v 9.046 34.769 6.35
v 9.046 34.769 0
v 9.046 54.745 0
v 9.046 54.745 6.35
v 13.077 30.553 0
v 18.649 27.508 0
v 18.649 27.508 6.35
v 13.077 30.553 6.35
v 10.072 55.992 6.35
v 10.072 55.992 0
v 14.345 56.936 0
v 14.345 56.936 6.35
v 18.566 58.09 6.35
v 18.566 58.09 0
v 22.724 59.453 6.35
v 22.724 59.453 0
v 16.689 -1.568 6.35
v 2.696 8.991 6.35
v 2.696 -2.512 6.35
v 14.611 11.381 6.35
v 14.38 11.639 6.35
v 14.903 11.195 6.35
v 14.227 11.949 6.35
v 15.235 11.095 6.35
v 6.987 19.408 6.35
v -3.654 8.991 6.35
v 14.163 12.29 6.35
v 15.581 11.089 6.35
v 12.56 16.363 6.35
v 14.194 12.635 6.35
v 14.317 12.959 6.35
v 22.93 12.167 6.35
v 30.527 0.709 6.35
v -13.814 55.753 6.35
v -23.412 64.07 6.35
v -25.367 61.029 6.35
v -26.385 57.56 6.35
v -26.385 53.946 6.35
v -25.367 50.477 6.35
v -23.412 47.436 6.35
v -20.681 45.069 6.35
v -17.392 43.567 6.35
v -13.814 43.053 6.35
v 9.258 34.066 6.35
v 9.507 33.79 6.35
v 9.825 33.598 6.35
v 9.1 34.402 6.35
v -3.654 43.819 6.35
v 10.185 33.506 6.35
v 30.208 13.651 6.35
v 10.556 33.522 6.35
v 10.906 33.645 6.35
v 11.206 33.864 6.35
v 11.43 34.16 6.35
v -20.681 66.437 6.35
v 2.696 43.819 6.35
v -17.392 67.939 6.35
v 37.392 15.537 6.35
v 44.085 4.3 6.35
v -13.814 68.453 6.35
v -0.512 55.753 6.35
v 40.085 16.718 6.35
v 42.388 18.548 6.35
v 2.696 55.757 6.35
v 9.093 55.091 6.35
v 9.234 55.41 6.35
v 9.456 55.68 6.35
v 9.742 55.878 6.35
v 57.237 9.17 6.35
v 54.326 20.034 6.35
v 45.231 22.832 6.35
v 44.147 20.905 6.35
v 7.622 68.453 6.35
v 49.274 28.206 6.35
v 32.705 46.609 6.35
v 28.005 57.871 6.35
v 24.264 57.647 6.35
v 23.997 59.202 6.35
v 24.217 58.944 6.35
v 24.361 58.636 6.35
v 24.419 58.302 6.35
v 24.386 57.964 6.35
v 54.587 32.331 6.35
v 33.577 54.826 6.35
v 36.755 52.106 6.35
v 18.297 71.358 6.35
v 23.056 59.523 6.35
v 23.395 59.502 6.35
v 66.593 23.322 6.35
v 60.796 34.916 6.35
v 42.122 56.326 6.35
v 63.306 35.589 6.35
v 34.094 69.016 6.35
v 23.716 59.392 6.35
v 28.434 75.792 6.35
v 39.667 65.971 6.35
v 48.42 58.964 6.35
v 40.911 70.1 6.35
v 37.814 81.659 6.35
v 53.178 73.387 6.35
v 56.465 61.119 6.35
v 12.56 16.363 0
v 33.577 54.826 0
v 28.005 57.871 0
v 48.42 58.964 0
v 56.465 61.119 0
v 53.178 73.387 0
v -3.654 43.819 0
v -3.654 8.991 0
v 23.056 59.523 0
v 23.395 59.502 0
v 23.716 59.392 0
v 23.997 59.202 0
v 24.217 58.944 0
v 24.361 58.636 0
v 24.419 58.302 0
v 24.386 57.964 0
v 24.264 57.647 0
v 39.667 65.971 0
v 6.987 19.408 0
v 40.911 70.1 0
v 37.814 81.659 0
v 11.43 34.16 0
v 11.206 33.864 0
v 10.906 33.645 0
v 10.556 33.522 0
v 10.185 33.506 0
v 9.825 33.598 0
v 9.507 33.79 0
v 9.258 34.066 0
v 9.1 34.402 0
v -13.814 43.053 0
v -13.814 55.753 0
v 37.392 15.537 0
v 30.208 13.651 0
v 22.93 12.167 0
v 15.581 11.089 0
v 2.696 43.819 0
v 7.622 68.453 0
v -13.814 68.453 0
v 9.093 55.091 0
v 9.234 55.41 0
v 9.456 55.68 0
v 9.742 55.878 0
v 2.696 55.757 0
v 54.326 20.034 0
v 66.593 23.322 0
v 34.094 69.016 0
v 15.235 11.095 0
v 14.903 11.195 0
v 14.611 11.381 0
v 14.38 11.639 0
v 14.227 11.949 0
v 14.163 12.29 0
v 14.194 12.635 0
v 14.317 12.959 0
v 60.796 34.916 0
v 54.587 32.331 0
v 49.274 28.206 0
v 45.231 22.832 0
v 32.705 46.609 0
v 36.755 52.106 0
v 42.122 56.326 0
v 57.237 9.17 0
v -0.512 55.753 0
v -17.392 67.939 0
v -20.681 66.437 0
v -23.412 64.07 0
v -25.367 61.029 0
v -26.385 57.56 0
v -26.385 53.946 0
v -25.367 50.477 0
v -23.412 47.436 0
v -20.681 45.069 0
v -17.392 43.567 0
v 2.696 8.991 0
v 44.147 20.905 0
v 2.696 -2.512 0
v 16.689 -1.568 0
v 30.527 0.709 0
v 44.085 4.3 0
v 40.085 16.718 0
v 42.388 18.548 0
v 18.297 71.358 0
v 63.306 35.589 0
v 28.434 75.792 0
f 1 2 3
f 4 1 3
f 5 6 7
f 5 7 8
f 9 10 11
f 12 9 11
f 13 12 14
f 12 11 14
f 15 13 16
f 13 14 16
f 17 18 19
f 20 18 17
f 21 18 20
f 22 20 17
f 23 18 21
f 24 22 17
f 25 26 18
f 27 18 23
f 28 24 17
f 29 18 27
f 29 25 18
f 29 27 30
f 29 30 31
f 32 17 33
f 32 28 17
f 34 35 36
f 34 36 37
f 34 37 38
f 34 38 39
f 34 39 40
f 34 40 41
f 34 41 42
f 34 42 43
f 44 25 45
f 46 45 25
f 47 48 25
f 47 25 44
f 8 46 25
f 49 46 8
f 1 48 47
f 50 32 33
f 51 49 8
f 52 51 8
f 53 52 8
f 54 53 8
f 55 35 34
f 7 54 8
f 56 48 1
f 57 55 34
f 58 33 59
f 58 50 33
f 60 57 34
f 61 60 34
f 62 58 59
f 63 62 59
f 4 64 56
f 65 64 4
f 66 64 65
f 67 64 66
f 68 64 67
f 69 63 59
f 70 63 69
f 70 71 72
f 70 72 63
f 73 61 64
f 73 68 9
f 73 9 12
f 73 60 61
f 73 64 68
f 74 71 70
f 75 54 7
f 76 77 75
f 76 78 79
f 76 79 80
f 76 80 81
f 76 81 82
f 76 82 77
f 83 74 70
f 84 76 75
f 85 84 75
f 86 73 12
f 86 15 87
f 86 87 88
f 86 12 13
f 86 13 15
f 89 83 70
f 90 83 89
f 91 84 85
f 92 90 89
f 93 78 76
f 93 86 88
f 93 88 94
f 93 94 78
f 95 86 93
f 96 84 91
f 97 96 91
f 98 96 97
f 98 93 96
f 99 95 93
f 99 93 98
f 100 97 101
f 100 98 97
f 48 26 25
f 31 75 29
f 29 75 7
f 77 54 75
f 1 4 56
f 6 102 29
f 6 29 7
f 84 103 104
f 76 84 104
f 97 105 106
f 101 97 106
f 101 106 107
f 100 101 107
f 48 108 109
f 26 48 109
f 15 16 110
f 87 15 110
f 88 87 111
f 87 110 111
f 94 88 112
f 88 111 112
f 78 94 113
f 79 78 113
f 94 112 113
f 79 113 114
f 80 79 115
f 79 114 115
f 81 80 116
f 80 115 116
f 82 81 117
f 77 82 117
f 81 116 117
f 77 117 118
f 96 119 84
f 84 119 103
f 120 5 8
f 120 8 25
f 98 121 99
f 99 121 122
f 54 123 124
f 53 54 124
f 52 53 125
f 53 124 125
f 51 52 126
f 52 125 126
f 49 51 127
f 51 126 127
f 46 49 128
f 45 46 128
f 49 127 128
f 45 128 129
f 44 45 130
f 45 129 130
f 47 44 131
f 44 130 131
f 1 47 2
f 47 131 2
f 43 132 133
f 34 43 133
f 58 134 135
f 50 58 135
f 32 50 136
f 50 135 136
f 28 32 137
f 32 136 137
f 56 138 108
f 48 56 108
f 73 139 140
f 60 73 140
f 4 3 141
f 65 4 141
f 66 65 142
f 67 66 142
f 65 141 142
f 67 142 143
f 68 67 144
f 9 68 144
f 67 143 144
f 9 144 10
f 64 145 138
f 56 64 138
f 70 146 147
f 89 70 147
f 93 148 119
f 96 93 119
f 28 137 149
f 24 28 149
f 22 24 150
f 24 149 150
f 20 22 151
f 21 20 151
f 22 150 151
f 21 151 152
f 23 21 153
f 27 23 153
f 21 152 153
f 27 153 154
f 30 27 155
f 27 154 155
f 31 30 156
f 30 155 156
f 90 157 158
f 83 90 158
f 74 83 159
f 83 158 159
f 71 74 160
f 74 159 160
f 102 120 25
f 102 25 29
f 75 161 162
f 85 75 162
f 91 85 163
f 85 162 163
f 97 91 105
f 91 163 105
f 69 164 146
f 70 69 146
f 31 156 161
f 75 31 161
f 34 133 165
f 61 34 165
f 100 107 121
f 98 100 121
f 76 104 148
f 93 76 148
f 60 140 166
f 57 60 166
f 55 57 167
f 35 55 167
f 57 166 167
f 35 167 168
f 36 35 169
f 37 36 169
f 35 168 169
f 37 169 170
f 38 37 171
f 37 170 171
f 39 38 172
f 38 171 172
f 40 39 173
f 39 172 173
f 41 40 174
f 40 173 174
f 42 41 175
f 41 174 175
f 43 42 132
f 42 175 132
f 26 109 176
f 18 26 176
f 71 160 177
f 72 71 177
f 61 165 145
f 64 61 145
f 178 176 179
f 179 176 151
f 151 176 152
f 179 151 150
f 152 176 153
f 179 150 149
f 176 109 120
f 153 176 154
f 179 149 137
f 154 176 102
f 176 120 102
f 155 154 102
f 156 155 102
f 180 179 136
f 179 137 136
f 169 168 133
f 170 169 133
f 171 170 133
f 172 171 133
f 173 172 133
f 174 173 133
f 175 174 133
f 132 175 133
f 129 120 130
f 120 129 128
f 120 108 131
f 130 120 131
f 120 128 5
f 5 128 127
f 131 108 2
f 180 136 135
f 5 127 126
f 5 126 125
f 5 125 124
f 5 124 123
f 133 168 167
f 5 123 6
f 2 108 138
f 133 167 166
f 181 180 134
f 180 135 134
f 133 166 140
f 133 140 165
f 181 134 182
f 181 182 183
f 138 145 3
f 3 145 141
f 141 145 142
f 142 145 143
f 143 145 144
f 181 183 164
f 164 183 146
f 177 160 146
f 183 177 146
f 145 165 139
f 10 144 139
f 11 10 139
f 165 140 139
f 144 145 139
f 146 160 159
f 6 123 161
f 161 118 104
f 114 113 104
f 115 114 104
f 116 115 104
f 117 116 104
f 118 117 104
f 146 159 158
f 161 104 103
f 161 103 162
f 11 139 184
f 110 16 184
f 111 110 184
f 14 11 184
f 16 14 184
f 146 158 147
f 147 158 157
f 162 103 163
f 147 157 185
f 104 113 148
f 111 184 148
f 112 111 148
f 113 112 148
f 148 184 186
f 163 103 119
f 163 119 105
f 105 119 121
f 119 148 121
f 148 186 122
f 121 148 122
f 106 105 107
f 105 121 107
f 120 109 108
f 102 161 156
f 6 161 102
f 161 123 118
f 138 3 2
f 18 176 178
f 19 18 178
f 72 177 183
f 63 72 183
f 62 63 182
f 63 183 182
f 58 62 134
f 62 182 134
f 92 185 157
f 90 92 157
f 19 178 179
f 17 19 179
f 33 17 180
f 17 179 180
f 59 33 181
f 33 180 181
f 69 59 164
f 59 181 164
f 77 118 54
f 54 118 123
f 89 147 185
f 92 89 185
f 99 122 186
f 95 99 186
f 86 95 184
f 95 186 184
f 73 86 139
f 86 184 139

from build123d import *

# Parameters (mm, degrees)
BOSS_EXTRUDE1_DEPTH = 6.35


with BuildPart() as part:
    # Sketch1 → Boss-Extrude1 (new body)
    with BuildSketch(Plane.XY):
        with BuildLine():
            Line((-13.814468498, 55.753), (-0.512454363, 55.753))
            Line((-0.512454363, 55.753), (2.695531502, 55.756757116))
            Line((2.695531502, 55.756757116), (2.695531502, 43.818757116))
            Line((2.695531502, 43.818757116), (-3.654468498, 43.818757116))
            Line((-3.654468498, 43.818757116), (-3.654468498, 8.990868624))
            Line((-3.654468498, 8.990868624), (2.695531502, 8.990868624))
            Line((2.695531502, 8.990868624), (2.695531502, -2.512333634))
            ThreePointArc((2.695531502, -2.512333634), (30.527357476, 0.70923947), (57.236842715, 9.170472751))
            Line((57.236842715, 9.170472751), (54.325835419, 20.034499879))
            Line((54.325835419, 20.034499879), (66.593093413, 23.321501752))
            Line((66.593093413, 23.321501752), (63.30609154, 35.588759746))
            Line((63.30609154, 35.588759746), (60.796097964, 34.916208994))
            ThreePointArc((60.796097964, 34.916208994), (51.793653569, 30.444949555), (45.230580184, 22.831656326))
            Line((45.230580184, 22.831656326), (44.147031561, 20.904803413))
            ThreePointArc((44.147031561, 20.904803413), (41.295489117, 17.558815877), (37.391946488, 15.536618596))
            ThreePointArc((37.391946488, 15.536618596), (26.579212526, 12.858245248), (15.581150656, 11.088630994))
            ThreePointArc((15.581150656, 11.088630994), (14.379521981, 11.63871145), (14.317303994, 12.958798154))
            Line((14.317303994, 12.958798154), (32.704850479, 46.608917104))
            ThreePointArc((32.704850479, 46.608917104), (39.295996489, 54.397381198), (48.420216702, 58.963778482))
            Line((48.420216702, 58.963778482), (56.465172321, 61.119417843))
            Line((56.465172321, 61.119417843), (53.178170448, 73.386675837))
            Line((53.178170448, 73.386675837), (40.910912454, 70.099673965))
            Line((40.910912454, 70.099673965), (37.813569329, 81.659115874))
            ThreePointArc((37.813569329, 81.659115874), (23.44688739, 73.388727882), (7.621608316, 68.453))
            Line((7.621608316, 68.453), (-13.814468498, 68.453))
            ThreePointArc((-13.814468498, 68.453), (-26.514468498, 55.753), (-13.814468498, 43.053))
            Line((-13.814468498, 43.053), (-13.814468498, 55.753))
        make_face()
        with BuildLine():
            Line((24.264057522, 57.64700047), (11.43, 34.160040827))
            ThreePointArc((11.43, 34.160040827), (10.00126648, 33.538520613), (9.045531502, 34.769023557))
            Line((9.045531502, 34.769023557), (9.045531502, 54.745185852))
            ThreePointArc((9.045531502, 54.745185852), (9.335322516, 55.552706963), (10.072445431, 55.991704669))
            ThreePointArc((10.072445431, 55.991704669), (16.462813232, 57.486670752), (22.724329021, 59.452667759))
            ThreePointArc((22.724329021, 59.452667759), (24.115953694, 59.080021624), (24.264057522, 57.64700047))
        make_face(mode=Mode.SUBTRACT)
        Polygon((33.576896794, 54.82609289), (28.004554301, 57.871006542), (34.094381606, 69.015691526), (39.666724099, 65.970777874), align=None, mode=Mode.SUBTRACT)
        Polygon((18.649366076, 27.507973818), (13.077023583, 30.552887471), (6.987196278, 19.408202487), (12.559538771, 16.363288834), align=None, mode=Mode.SUBTRACT)
    extrude(amount=BOSS_EXTRUDE1_DEPTH)


solid = part.part
